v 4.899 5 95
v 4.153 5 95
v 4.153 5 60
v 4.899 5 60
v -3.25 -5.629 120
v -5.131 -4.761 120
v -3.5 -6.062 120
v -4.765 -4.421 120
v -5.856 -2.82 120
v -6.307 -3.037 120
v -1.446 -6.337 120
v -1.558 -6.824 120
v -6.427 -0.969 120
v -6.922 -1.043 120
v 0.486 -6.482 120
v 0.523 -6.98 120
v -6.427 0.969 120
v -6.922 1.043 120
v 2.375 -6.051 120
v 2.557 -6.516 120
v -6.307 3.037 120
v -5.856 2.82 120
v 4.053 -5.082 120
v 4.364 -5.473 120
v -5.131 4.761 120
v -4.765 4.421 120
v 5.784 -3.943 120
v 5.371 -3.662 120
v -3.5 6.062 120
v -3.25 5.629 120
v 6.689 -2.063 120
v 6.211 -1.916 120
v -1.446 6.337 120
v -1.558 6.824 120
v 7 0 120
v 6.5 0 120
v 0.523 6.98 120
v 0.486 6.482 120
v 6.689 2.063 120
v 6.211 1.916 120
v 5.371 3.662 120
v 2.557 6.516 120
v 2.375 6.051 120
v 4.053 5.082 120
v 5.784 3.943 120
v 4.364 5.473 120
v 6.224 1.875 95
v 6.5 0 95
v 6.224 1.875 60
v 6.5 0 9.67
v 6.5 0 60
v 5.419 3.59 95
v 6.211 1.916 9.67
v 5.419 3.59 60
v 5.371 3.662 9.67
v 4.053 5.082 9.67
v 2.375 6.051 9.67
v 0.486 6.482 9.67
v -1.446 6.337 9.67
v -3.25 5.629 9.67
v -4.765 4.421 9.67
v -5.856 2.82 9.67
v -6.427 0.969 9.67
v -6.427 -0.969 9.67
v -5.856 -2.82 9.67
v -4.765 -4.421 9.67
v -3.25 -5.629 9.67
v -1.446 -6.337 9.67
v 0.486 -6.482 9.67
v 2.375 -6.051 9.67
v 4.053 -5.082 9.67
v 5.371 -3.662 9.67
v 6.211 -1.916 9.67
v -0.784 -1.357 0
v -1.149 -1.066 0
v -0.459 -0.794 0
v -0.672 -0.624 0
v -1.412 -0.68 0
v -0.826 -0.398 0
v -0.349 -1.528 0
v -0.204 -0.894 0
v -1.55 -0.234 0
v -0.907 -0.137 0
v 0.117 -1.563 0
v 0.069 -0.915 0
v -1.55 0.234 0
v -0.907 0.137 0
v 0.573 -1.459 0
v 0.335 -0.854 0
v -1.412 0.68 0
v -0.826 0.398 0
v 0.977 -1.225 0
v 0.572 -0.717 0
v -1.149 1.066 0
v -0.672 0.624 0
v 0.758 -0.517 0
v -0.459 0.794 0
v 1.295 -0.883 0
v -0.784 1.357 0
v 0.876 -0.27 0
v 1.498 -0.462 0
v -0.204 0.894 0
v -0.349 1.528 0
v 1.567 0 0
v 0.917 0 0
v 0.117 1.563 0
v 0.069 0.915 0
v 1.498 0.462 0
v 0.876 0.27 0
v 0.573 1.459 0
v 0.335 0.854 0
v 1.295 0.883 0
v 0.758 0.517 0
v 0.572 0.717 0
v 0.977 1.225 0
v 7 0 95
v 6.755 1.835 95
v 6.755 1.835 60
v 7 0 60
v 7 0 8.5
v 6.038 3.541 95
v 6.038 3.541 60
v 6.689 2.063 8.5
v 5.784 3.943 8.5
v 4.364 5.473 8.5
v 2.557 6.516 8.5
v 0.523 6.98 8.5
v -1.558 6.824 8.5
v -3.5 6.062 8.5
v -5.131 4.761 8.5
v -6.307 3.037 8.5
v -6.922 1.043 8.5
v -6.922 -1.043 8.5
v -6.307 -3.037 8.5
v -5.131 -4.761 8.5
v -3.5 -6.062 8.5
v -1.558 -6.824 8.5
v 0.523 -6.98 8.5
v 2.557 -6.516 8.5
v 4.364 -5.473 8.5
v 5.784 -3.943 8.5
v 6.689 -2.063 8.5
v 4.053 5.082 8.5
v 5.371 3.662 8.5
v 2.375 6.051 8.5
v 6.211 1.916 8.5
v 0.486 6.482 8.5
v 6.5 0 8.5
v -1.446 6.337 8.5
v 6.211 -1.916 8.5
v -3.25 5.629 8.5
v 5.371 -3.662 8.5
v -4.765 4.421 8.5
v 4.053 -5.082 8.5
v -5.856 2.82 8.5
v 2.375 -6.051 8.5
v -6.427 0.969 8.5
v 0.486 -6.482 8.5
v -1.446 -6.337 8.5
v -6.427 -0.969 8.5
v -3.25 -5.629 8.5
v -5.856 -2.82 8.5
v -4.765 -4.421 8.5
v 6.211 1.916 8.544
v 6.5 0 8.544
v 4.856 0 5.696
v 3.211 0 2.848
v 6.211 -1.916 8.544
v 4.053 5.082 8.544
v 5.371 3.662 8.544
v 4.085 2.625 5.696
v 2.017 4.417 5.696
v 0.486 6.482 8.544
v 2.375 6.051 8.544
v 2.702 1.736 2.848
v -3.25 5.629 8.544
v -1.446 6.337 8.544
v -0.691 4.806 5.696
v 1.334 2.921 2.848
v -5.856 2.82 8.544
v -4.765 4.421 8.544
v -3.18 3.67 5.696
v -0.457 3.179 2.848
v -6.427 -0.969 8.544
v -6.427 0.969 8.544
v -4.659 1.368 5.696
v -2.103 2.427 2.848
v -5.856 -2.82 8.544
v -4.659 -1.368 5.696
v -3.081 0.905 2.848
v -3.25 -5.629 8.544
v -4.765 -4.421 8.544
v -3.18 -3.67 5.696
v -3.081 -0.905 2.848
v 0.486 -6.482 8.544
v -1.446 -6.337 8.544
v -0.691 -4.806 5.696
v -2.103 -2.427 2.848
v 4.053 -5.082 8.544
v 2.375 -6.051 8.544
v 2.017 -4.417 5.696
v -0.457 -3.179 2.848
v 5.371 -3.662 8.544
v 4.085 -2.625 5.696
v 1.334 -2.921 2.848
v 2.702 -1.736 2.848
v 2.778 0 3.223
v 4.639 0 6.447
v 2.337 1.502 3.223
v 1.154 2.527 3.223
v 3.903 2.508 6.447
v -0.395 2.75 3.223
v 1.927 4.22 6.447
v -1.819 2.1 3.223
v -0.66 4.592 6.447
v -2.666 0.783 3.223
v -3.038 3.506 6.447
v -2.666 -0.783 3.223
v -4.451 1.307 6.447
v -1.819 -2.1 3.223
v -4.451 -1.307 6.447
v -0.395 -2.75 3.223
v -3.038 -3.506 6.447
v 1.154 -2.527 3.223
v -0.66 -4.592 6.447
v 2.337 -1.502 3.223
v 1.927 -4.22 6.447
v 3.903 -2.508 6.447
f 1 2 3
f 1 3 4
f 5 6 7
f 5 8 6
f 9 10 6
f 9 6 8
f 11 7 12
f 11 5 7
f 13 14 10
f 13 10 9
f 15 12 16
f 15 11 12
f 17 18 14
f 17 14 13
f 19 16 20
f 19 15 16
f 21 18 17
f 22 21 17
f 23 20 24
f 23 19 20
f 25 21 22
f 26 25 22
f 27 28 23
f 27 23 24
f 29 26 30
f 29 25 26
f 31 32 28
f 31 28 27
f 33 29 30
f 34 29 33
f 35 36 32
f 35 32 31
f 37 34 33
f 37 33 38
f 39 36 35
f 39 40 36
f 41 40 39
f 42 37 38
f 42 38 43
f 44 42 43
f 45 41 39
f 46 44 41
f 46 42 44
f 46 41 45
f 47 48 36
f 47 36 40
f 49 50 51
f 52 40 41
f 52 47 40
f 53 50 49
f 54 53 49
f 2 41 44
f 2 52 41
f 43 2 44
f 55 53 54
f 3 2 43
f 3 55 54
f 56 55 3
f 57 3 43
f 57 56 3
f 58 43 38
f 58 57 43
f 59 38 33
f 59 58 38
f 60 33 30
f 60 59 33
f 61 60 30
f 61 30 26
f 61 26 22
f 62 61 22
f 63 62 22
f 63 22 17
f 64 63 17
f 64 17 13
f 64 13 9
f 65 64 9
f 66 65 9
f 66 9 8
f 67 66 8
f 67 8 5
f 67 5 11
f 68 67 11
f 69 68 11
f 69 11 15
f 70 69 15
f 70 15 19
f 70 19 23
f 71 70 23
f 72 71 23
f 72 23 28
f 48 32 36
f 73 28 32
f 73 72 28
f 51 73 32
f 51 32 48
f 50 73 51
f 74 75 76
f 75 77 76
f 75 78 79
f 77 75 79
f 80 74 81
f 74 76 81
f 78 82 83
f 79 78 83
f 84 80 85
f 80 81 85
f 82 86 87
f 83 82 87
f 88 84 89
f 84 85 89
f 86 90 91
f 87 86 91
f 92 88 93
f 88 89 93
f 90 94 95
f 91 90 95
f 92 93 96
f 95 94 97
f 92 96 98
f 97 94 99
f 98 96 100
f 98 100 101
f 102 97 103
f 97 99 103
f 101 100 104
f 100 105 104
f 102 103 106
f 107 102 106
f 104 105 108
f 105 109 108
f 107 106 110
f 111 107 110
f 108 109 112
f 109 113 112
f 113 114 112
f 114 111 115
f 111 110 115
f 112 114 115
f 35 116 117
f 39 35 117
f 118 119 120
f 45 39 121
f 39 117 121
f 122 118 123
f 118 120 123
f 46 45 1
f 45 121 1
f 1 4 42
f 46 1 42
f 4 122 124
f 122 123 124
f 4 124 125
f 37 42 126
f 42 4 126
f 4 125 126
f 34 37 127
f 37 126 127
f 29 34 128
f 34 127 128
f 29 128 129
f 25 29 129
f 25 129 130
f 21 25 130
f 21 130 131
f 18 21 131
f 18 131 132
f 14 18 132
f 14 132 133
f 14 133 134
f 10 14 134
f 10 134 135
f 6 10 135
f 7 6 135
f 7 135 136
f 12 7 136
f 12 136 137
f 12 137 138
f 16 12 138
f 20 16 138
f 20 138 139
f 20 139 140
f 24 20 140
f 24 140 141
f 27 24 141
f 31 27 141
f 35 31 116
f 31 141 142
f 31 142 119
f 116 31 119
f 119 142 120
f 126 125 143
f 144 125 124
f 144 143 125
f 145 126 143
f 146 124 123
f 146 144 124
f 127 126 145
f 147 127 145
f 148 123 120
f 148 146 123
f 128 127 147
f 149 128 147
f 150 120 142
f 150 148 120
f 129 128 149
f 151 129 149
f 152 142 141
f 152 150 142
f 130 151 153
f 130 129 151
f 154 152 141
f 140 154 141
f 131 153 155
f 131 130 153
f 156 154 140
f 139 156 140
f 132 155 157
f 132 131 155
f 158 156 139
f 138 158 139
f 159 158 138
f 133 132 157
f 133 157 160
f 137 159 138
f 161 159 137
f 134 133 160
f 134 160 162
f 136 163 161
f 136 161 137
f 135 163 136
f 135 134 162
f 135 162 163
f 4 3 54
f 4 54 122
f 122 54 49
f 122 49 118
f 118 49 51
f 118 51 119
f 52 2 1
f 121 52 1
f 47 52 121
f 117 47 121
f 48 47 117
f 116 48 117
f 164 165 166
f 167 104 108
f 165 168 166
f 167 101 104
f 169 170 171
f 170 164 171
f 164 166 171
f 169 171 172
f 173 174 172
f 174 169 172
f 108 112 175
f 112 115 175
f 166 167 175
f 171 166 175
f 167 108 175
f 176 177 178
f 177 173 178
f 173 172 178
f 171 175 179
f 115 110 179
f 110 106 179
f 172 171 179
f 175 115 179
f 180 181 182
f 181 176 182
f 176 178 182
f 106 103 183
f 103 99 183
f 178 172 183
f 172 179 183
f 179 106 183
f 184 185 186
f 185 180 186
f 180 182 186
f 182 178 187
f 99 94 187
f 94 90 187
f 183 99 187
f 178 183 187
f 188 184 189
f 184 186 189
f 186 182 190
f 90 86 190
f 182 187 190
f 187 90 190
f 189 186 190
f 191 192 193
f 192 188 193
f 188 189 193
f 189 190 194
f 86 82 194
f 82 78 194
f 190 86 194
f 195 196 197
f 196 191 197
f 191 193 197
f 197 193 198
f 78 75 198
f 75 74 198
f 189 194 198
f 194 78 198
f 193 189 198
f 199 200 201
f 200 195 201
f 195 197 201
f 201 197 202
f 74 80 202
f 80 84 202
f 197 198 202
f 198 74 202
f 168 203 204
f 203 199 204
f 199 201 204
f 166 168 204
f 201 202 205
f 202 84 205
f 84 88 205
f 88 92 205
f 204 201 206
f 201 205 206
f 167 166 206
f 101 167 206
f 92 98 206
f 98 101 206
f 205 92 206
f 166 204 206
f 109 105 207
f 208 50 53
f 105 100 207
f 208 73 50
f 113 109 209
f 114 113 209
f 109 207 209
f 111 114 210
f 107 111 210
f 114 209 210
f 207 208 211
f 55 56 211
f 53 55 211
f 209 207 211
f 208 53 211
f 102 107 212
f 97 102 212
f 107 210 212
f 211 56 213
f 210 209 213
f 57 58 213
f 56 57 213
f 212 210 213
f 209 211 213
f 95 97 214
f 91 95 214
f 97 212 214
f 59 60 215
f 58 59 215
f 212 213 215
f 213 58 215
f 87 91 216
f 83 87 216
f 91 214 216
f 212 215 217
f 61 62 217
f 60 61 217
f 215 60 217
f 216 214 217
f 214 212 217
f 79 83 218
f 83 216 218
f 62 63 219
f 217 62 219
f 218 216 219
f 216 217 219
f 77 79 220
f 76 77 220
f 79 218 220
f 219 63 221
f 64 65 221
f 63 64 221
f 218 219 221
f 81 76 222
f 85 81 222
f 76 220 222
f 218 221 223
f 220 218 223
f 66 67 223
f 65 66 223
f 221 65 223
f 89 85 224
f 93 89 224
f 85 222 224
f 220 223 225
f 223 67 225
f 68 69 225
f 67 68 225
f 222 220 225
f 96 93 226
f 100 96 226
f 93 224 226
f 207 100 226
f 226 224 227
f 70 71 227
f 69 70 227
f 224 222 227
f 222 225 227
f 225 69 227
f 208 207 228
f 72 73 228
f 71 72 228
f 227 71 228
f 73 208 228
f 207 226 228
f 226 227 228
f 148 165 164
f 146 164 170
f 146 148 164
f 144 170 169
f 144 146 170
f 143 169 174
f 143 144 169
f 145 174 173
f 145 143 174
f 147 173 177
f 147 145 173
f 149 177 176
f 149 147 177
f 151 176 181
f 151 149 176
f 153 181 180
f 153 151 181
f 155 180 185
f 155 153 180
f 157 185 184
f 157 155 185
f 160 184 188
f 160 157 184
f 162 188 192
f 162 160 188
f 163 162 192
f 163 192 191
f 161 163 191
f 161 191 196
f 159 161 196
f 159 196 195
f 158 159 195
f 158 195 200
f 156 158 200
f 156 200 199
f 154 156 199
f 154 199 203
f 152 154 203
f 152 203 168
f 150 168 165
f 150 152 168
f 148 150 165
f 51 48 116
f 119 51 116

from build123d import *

# Parameters (mm, degrees)
SKETCH_R             = 7
SKETCH_R_2           = 6.5
PAD_DEPTH            = 120
REVOLUTION_FACE7_R   = 7
REVOLUTION_FACE7_R_2 = 6.5
POCKET_DEPTH         = 8.5
SKETCH003_W          = 5
SKETCH003_H          = 35
POCKET001_DEPTH      = 5


with BuildPart() as part:
    # Sketch → Pad (new body)
    with BuildSketch(Plane.XY):
        Circle(SKETCH_R)
        Circle(SKETCH_R_2, mode=Mode.SUBTRACT)
    extrude(amount=PAD_DEPTH)

    # Sketch001 → Revolution (revolve)
    with BuildSketch(Plane.XZ):
        Polygon((0.917134, 0), (7, 10.535833), (7, 9.41), (1.567134, 0), align=None)
    revolve(axis=Axis((0, 0, 0), (0, 0, 1)))

    # Revolution Face7 → Pocket (cut)
    with BuildSketch(Plane(origin=(0, 0, 0), x_dir=(0, -1, 0), z_dir=(0, 0, -1))):
        Circle(REVOLUTION_FACE7_R)
        Circle(REVOLUTION_FACE7_R_2, mode=Mode.SUBTRACT)
    extrude(amount=-POCKET_DEPTH, mode=Mode.SUBTRACT)

    # Sketch003 → Pocket001 (cut)
    with BuildSketch(Plane.XZ):
        with Locations((4.91, 77.5)):
            Rectangle(SKETCH003_W, SKETCH003_H)
    extrude(amount=-POCKET001_DEPTH, mode=Mode.SUBTRACT)


solid = part.part
